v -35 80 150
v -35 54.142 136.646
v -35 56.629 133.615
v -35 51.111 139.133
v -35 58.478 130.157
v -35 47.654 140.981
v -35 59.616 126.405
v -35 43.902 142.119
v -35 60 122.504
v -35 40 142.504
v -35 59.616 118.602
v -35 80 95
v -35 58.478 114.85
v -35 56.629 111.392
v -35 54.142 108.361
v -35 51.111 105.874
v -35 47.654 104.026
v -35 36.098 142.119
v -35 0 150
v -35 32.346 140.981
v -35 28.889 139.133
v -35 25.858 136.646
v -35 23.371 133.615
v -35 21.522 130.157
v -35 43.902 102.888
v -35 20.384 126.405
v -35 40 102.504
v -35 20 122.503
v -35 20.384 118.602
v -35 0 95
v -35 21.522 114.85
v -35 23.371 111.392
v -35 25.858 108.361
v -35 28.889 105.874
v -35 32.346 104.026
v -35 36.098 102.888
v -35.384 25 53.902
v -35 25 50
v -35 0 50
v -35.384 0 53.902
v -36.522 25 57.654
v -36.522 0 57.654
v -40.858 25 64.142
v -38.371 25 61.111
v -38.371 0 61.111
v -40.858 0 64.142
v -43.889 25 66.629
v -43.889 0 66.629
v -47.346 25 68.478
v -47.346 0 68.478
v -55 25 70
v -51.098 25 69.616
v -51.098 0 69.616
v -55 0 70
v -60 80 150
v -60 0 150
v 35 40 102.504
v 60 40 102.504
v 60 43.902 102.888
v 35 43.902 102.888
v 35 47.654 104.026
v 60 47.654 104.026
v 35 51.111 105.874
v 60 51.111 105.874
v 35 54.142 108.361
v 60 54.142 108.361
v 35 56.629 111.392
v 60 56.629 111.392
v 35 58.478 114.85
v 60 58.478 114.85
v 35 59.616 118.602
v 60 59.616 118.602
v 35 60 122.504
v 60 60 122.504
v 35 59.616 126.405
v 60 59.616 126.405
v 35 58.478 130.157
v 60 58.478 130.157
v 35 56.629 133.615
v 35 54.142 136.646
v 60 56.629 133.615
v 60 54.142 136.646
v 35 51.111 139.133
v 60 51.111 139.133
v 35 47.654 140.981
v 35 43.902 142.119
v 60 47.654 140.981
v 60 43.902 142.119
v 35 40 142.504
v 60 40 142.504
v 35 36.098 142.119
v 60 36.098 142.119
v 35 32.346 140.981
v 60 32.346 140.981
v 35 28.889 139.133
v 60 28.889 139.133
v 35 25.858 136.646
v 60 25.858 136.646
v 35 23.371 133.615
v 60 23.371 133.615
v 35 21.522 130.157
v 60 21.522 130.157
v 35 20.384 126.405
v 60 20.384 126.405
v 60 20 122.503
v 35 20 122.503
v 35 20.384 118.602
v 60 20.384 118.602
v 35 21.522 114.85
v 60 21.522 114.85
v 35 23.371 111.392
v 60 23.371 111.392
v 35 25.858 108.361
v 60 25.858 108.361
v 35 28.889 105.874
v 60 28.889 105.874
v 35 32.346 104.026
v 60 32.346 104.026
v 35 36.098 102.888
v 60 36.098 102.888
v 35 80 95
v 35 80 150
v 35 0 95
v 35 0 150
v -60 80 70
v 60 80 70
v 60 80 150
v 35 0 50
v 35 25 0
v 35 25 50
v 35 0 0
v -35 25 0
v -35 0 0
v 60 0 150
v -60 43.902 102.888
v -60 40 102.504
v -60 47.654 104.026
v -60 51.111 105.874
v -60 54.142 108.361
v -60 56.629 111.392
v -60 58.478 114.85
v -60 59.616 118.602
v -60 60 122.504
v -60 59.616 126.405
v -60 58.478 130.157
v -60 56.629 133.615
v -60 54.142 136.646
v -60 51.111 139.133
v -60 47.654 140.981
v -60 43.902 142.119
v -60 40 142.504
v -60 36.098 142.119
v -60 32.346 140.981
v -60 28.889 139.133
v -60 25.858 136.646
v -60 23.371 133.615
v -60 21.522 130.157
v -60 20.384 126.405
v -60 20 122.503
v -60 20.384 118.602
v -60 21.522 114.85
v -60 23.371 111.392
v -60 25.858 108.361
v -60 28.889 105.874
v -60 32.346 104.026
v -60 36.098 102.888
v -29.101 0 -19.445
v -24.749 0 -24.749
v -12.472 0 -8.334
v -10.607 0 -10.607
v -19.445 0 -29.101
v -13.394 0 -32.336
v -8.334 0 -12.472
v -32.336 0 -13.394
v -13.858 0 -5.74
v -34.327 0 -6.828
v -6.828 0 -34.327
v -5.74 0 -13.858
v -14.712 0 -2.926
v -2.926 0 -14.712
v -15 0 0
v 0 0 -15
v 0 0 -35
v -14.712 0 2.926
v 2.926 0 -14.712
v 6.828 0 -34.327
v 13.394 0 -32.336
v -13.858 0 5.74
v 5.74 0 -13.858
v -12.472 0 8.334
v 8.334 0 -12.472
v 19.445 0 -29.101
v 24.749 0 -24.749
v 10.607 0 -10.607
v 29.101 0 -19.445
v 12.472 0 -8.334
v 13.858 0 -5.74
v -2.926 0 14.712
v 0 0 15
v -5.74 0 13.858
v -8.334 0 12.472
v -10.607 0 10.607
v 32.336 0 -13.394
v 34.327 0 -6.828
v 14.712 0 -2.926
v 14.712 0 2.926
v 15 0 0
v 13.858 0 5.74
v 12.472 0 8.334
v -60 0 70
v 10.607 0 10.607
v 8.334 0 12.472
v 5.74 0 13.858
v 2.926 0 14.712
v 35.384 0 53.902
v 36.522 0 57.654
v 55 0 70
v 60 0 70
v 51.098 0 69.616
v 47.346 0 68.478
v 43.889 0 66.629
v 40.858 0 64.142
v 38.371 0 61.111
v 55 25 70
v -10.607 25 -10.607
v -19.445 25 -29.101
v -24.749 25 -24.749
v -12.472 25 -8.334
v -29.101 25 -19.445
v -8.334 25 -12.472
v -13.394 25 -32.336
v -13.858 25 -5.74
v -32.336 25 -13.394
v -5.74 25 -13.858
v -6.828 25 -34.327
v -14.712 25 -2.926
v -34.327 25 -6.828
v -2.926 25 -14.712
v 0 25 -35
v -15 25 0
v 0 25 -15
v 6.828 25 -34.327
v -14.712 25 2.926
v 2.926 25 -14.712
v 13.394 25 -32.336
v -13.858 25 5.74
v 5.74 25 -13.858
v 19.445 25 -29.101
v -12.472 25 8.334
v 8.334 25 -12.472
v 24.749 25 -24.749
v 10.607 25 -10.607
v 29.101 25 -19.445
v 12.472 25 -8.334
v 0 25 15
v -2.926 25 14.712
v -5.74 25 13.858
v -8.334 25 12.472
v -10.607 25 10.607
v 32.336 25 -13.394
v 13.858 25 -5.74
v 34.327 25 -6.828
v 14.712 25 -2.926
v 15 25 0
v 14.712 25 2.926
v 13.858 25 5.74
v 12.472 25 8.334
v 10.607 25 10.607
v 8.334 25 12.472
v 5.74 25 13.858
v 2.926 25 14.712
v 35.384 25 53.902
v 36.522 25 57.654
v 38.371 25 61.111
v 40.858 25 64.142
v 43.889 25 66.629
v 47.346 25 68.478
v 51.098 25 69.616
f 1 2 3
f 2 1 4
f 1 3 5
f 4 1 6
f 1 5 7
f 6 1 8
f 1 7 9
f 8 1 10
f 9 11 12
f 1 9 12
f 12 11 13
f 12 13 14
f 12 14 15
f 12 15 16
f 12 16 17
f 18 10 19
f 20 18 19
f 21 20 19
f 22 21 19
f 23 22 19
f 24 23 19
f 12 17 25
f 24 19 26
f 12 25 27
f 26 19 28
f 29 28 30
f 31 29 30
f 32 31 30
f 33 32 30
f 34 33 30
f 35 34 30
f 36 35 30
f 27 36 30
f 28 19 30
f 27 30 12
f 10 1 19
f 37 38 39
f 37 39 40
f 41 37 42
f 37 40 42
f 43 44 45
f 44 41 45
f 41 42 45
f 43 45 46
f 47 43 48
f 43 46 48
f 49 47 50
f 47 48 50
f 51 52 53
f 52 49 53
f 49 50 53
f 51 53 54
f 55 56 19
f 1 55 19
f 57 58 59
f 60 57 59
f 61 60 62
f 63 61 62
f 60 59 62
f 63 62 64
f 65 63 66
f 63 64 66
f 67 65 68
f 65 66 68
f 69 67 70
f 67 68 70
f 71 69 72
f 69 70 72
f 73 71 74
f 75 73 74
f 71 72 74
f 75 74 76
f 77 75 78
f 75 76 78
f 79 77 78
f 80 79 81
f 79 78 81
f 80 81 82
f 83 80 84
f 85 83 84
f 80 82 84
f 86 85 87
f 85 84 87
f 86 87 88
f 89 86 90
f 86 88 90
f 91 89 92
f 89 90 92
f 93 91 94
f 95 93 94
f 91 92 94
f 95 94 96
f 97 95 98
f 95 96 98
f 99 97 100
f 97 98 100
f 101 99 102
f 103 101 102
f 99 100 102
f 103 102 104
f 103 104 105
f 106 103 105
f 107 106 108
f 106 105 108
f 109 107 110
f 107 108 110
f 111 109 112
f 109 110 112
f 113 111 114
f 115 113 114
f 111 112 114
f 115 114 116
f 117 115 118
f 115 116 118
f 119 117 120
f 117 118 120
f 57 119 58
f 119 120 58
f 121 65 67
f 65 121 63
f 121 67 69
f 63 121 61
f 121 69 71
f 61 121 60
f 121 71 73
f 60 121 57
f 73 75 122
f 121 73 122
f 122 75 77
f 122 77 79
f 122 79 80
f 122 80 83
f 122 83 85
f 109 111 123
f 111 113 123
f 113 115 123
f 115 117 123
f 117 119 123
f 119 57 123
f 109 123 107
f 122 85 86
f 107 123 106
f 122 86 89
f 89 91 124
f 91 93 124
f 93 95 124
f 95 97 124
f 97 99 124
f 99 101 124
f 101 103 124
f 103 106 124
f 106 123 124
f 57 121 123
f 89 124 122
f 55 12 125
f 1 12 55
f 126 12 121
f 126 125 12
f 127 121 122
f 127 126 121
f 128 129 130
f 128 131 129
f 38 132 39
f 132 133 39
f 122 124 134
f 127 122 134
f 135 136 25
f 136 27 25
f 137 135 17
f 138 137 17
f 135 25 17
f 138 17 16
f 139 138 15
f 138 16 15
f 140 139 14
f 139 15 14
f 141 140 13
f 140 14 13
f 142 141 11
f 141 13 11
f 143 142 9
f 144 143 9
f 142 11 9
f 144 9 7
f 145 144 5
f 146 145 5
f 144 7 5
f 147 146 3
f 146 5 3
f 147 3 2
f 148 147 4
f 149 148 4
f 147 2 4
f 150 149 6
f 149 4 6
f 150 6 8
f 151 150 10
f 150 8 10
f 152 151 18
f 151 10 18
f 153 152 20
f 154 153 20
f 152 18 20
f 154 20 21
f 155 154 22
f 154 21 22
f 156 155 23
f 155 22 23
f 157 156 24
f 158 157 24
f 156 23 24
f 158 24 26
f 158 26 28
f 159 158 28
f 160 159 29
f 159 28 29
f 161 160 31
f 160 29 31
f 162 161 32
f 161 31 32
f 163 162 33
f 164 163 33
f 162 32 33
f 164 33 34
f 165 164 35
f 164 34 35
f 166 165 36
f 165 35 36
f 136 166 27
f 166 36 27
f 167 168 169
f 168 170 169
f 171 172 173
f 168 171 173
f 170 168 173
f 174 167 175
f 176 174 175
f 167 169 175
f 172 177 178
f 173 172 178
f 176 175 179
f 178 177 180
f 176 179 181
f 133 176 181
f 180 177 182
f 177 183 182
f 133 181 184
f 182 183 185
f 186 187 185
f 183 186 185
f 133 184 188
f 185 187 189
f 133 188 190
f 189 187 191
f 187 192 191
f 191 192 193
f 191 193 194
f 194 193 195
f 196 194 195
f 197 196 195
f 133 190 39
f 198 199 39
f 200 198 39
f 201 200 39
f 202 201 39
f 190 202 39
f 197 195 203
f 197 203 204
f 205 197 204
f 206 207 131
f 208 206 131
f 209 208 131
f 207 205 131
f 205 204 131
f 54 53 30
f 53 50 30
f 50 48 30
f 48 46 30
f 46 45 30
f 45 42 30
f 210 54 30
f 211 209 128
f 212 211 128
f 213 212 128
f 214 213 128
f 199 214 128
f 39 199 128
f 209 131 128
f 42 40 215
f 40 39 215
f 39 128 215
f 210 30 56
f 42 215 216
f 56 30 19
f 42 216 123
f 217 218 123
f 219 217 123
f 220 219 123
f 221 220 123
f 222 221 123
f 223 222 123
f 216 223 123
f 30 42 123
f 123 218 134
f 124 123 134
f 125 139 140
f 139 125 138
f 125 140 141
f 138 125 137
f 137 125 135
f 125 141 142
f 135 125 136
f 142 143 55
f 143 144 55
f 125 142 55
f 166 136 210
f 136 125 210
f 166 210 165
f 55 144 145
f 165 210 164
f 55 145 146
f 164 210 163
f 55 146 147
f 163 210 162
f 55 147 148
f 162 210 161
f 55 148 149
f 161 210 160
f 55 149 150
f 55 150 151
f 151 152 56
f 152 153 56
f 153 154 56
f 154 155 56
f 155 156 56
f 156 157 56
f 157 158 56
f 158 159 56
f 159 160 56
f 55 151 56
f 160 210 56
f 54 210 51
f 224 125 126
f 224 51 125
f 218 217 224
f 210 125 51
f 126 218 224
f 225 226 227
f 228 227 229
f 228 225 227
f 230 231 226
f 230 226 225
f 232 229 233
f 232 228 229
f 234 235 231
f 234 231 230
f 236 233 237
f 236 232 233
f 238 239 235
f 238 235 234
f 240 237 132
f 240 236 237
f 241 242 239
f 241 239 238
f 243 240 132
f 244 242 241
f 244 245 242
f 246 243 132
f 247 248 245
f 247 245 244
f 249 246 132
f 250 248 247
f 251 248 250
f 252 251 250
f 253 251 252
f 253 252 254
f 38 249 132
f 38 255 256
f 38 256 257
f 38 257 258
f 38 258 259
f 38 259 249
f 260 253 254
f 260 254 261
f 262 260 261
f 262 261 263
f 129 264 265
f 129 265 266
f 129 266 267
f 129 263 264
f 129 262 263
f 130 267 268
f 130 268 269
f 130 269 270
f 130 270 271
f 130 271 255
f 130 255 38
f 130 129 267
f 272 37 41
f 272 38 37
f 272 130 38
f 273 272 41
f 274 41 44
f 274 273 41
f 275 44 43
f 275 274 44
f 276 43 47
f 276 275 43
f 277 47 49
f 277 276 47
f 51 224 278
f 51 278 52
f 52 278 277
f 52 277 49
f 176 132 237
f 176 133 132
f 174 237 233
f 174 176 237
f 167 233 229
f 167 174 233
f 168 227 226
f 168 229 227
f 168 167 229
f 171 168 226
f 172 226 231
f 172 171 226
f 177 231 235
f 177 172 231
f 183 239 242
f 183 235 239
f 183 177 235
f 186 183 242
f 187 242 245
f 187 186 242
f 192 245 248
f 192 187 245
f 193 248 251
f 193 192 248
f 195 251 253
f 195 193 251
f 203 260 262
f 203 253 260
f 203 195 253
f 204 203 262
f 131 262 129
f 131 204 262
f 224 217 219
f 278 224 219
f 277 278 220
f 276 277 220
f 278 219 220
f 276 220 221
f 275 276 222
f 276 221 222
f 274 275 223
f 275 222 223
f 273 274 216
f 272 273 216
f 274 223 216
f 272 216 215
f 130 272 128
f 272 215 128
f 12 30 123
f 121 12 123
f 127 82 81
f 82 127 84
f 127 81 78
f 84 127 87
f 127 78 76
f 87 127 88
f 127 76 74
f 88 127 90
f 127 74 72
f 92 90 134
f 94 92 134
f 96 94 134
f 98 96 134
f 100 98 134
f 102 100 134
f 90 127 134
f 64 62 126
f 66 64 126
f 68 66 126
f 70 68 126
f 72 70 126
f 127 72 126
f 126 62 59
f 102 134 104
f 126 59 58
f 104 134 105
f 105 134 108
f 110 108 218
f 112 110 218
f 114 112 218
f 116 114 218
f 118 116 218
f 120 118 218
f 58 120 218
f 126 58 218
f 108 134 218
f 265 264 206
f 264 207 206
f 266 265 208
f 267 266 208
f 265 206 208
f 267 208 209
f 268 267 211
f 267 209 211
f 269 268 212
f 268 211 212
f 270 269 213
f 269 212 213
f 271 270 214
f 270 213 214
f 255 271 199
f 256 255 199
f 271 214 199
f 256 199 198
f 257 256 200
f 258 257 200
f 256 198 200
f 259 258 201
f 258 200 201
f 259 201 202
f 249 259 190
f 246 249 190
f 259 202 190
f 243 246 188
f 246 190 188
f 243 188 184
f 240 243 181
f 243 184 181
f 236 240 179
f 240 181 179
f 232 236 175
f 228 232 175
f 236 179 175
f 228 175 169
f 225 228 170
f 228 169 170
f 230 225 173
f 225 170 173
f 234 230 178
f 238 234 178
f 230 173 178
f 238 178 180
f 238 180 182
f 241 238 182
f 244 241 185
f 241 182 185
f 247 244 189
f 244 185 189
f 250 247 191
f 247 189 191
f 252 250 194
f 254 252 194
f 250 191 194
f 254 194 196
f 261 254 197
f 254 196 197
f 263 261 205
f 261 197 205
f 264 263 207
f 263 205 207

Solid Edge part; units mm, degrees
sketch "Sketch1" plane through (0, 0, 0) normal (0, -1, 0) x (1, 0, 0)
  line L0 (-55, 70) -> (55, 70)
  arc A0 (55, 70) -> (35, 50) centre (55, 50) ccw
  line L1 (35, 0) -> (35, 50)
  line L2 (-35, 0) -> (-35, 50)
  arc A1 (-55, 70) -> (-35, 50) centre (-55, 50) cw
  arc A2 (35, 0) -> (-35, 0) centre (0, 0) cw
extrude "Protrusion1" add sketch "Sketch1" against normal blind 25
sketch "Sketch2" plane through (0, 0, 17.5) normal (0, -1, 0) x (1, 0, 0)
  line L0 (-60, 132.5) -> (-35, 132.5)
  line L1 (-35, 132.5) -> (-35, 77.5)
  line L2 (-35, 77.5) -> (35, 77.5)
  line L3 (35, 77.5) -> (35, 132.5)
  line L4 (35, 132.5) -> (60, 132.5)
  line L5 (60, 132.5) -> (60, 52.5)
  line L6 (-60, 52.5) -> (60, 52.5)
  line L7 (-60, 52.5) -> (-60, 132.5)
extrude "ExtrudedProtrusion_2" add sketch "Sketch2" against normal blind 80
sketch "Sketch3" plane through (0, 0, 57.5) normal (0, -1, 0) x (1, 0, 0)
  circle A0 centre (0, -57.5) radius 15
extrude "ExtrudedCutout_1" cut sketch "Sketch3" against normal blind 25
sketch "Sketch4" plane through (60, 40, 110) normal (1, 0, 0) x (0, 0, -1)
  circle A0 centre (-12.5035, 0) radius 20
extrude "ExtrudedCutout_5" cut sketch "Sketch4" against normal blind 120
